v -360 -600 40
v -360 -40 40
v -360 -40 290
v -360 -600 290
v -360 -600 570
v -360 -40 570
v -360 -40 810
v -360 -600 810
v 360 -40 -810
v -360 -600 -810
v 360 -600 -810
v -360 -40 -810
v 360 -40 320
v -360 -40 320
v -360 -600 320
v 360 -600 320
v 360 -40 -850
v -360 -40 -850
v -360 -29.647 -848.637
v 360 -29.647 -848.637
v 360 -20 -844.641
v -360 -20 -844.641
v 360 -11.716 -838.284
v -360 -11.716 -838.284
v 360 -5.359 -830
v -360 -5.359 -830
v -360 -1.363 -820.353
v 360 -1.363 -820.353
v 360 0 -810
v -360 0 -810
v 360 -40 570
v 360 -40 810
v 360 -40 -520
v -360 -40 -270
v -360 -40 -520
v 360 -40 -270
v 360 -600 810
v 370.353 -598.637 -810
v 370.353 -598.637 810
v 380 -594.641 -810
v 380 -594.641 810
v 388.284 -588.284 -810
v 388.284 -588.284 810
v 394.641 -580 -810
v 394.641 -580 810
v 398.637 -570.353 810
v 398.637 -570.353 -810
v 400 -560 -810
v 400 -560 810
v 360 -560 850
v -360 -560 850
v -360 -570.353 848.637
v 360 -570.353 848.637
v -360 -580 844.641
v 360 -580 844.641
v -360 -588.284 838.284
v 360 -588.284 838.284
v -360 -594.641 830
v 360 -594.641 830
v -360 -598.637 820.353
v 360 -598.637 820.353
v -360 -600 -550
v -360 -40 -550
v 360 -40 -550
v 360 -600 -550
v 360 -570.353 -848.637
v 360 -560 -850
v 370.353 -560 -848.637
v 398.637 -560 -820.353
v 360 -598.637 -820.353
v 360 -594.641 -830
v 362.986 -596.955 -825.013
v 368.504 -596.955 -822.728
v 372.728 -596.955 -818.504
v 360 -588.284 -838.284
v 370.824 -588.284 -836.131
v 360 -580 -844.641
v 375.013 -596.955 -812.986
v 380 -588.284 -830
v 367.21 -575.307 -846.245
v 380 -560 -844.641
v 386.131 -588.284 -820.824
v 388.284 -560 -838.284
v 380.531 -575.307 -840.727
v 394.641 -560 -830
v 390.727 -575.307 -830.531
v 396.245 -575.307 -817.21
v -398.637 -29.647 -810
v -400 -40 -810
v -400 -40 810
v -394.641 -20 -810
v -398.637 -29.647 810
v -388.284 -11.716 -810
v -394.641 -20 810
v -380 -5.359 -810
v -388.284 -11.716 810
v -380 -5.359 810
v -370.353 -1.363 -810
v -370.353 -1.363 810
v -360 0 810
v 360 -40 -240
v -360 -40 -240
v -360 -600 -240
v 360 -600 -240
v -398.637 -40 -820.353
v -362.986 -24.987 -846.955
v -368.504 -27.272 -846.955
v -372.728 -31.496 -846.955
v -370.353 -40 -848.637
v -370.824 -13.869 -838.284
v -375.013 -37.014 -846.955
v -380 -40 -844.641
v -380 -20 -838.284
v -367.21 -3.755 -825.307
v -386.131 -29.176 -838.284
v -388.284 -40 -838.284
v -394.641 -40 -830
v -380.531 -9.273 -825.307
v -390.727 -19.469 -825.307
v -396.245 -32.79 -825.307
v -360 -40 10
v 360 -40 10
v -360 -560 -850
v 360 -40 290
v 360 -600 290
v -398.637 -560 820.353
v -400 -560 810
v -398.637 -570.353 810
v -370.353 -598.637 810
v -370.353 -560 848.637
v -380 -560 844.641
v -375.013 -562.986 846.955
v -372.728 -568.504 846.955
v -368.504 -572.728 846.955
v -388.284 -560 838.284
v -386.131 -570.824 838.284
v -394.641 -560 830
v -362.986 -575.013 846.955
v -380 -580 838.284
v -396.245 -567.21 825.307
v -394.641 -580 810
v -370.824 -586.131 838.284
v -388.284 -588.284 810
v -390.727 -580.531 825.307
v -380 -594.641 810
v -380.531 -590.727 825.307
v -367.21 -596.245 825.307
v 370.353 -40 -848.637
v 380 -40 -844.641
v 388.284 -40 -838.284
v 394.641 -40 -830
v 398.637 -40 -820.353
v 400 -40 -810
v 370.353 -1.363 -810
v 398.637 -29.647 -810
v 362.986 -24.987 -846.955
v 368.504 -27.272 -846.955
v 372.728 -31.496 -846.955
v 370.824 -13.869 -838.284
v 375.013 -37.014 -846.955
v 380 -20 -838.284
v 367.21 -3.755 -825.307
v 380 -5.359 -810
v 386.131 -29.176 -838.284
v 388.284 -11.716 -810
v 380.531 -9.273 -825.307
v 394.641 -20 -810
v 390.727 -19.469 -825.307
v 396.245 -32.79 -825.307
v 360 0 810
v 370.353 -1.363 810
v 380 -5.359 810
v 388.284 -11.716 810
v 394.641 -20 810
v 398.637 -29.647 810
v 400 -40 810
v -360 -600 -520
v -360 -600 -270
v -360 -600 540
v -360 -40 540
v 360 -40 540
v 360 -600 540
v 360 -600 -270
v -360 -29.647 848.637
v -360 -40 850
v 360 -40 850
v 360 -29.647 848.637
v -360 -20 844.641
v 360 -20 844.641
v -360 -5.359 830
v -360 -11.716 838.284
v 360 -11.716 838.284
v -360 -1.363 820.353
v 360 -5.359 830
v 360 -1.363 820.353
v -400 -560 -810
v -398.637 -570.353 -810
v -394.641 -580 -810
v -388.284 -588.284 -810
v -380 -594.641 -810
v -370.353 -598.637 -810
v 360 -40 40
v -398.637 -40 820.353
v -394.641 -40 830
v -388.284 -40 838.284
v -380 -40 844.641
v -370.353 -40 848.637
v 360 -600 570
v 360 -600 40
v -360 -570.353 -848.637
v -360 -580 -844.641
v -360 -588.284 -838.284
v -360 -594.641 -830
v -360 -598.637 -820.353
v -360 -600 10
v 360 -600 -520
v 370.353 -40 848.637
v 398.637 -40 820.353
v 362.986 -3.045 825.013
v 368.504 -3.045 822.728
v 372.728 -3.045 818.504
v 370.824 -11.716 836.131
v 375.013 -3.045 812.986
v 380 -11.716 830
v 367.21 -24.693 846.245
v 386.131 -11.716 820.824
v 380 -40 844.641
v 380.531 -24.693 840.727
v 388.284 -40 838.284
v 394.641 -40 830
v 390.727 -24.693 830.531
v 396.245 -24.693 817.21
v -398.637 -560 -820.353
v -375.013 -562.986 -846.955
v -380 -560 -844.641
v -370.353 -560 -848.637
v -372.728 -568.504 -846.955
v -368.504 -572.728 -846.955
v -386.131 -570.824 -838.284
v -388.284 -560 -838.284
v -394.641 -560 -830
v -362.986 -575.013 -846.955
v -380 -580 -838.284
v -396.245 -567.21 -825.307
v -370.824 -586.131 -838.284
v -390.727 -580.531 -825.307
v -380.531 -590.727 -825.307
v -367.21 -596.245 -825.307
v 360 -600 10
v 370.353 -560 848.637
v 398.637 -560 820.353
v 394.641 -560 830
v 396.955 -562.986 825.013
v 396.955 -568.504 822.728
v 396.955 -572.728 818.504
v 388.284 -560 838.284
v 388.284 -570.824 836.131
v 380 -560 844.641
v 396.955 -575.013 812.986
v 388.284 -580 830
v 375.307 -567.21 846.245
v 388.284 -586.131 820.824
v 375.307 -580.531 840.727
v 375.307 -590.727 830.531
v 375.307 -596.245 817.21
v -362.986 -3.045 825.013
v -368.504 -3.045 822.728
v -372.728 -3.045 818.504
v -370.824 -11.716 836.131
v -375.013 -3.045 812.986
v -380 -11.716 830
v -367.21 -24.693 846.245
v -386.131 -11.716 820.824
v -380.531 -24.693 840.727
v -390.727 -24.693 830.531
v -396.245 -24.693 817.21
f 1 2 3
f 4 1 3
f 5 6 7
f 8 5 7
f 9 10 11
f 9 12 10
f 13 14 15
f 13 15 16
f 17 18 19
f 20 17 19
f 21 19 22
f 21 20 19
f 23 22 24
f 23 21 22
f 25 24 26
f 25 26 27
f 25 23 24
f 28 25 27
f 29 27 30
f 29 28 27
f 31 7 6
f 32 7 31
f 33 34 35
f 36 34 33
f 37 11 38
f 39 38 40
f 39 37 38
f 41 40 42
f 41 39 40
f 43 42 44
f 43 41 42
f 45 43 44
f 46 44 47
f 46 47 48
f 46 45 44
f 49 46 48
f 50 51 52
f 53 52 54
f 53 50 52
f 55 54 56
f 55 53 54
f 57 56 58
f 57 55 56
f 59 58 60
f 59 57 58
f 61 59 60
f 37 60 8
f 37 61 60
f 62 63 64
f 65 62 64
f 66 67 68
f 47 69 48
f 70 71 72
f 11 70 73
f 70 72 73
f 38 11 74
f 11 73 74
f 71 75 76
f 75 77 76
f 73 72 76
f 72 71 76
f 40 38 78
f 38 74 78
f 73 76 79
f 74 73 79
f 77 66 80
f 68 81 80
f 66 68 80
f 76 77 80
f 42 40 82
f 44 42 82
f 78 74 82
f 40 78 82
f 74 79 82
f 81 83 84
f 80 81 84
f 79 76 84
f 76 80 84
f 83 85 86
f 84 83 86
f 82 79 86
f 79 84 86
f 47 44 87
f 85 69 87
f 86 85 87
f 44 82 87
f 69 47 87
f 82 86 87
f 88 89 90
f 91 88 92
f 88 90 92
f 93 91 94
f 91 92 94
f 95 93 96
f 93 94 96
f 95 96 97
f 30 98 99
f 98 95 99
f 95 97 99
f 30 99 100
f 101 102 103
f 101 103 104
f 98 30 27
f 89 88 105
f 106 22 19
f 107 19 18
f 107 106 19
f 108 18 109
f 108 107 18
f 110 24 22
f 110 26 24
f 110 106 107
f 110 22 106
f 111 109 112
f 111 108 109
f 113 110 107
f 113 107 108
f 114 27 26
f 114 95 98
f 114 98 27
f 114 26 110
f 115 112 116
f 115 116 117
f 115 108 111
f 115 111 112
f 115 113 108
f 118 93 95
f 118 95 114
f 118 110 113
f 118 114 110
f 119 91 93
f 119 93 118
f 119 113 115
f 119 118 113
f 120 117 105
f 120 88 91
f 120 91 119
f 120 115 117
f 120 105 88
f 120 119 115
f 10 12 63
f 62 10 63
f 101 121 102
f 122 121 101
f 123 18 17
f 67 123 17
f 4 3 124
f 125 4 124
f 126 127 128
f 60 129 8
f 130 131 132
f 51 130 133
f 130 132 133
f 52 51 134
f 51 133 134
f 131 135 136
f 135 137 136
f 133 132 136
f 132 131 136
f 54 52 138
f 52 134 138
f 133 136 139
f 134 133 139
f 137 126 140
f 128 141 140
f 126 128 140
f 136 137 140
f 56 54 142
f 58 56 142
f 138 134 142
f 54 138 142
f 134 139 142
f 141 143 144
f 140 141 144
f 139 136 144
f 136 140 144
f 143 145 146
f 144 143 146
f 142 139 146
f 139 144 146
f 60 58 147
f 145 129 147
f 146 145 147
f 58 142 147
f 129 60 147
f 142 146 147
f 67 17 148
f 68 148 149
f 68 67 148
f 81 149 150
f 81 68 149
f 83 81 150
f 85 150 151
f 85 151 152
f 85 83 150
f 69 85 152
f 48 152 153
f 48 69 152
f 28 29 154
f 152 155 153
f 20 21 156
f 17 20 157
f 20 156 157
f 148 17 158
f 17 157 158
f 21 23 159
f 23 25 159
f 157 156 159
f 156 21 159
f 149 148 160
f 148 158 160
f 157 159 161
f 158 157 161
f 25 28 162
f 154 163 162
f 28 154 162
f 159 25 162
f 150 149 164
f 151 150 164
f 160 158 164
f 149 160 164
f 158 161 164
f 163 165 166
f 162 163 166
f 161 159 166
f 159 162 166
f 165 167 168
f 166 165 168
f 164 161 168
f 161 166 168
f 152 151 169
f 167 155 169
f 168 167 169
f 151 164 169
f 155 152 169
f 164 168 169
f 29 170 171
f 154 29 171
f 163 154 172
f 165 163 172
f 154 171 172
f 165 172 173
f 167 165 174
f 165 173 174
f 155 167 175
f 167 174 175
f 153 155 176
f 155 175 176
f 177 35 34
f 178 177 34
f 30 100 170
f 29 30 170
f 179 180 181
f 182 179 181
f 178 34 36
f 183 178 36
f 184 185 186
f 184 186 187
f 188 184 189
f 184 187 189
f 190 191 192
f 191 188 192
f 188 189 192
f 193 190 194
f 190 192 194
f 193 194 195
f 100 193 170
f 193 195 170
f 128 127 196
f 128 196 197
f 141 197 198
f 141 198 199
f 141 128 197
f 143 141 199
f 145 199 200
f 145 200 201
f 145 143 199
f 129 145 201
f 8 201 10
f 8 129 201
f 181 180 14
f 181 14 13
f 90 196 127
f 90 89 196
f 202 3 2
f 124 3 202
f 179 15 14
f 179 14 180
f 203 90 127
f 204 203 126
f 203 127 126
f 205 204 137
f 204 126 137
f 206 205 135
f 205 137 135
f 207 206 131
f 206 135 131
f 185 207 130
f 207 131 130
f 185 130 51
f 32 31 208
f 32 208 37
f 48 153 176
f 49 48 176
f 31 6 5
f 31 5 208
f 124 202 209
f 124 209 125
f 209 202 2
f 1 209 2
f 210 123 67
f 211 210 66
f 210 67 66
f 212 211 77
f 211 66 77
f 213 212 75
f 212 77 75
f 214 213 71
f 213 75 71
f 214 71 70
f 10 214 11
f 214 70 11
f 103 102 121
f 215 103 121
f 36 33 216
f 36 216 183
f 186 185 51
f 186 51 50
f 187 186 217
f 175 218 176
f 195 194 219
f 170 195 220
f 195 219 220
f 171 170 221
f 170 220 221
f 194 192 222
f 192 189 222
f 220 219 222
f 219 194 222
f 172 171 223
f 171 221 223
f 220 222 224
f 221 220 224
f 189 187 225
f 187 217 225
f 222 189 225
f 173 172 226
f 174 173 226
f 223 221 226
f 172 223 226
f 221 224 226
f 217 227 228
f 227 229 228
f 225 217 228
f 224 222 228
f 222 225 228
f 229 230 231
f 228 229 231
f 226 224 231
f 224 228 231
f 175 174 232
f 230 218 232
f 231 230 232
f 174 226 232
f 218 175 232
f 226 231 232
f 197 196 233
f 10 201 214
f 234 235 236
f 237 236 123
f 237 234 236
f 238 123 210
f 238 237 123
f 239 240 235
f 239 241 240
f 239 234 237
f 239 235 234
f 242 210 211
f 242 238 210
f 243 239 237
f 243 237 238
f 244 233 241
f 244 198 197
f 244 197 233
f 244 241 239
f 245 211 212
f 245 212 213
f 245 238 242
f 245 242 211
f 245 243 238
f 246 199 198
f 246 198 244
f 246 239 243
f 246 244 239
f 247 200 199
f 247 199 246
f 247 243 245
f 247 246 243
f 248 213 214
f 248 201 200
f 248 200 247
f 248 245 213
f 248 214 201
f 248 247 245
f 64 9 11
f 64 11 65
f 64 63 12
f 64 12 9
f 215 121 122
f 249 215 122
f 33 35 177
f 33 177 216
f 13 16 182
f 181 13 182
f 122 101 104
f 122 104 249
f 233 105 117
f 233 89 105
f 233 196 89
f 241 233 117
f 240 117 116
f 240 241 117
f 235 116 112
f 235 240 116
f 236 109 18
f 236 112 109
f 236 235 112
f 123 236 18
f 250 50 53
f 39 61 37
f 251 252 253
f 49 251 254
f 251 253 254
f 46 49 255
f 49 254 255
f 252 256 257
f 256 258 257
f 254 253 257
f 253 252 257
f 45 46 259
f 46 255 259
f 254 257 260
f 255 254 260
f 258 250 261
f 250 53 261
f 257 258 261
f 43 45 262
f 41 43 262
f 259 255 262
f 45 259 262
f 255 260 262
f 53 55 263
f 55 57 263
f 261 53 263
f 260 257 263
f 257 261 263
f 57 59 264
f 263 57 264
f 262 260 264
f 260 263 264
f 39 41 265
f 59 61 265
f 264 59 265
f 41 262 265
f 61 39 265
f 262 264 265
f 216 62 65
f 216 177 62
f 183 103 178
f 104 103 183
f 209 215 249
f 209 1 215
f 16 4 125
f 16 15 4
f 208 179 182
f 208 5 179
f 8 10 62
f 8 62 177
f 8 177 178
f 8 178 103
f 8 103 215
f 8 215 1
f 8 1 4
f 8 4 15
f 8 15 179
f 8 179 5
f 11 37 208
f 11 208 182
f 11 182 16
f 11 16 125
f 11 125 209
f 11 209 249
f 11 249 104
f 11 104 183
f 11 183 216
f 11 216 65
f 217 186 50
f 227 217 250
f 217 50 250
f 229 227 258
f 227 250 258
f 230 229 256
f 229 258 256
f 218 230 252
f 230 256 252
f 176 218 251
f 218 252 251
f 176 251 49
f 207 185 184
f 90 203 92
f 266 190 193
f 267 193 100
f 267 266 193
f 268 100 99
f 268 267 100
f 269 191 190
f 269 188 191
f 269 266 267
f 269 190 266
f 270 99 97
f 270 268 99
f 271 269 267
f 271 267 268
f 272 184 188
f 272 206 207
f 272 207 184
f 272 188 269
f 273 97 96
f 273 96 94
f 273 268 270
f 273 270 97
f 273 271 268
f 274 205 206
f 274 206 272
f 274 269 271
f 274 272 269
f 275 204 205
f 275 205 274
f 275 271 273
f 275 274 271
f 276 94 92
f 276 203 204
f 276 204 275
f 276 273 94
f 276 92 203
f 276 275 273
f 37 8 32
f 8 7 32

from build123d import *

# Parameters (mm, degrees)
F0_W      = 800
F0_H      = 1700
F1_DEPTH  = 600
F2_T      = -40
F3_W      = 720
F3_H      = 30
F4_DEPTH  = 560
F5_R      = 39.99999
F7_DEPTH  = 560
F8_W      = 720
F8_H      = 30
F9_DEPTH  = 560
F10_W     = 720
F10_H     = 30
F11_DEPTH = 560


# Not quite as in the source:
# - a fillet or chamfer is up to 0.001 mm smaller than in the source, because OpenCascade refuses the exact size


with BuildPart() as f1:
    # F0 (on Front) → F1 (new body)
    with BuildSketch(Plane.XZ):
        Rectangle(F0_W, F0_H)
    extrude(amount=F1_DEPTH)

    # F2
    f2_openings = [f1.faces().sort_by_distance(p)[0] for p in [
        (0, -600, 0),
    ]]
    offset(amount=F2_T, openings=f2_openings)

    # F3 (on face) → F4 (join)
    with BuildSketch(Plane.XZ.offset(40)):
        with Locations((0, -255)):
            Rectangle(F3_W, F3_H)
    extrude(amount=F4_DEPTH)

    # F5 (radius 40 in the source; OpenCascade refuses exactly that, so slightly less here)
    f5_edges = [f1.edges().sort_by_distance(p)[0] for p in [
        (-400, -600, 0),
        (-400, -300, 850),
        (0, -600, 850),
        (400, -300, 850),
        (0, 0, 850),
        (-400, 0, 0),
        (400, 0, 0),
        (0, 0, -850),
        (-400, -300, -850),
        (400, -300, -850),
        (0, -600, -850),
        (400, -600, 0),
    ]]
    fillet(f5_edges, radius=F5_R)

    # F6 (on face) → F7 (join)
    with BuildSketch(Plane.XZ.offset(40)):
        Polygon((360, 40), (-360, 40), (-360, 20.5096974969), (-360, 10), (360, 10), align=None)
    extrude(amount=F7_DEPTH)

    # F8 (on face) → F9 (join)
    with BuildSketch(Plane.XZ.offset(40)):
        with Locations((0, -535)):
            Rectangle(F8_W, F8_H)
    extrude(amount=F9_DEPTH)

    # F10 (on face) → F11 (join)
    with BuildSketch(Plane.XZ.offset(40)):
        with Locations((0, 305)):
            Rectangle(F10_W, F10_H)
        with Locations((0, 555)):
            Rectangle(F10_W, F10_H)
    extrude(amount=F11_DEPTH)


solid = f1.part
